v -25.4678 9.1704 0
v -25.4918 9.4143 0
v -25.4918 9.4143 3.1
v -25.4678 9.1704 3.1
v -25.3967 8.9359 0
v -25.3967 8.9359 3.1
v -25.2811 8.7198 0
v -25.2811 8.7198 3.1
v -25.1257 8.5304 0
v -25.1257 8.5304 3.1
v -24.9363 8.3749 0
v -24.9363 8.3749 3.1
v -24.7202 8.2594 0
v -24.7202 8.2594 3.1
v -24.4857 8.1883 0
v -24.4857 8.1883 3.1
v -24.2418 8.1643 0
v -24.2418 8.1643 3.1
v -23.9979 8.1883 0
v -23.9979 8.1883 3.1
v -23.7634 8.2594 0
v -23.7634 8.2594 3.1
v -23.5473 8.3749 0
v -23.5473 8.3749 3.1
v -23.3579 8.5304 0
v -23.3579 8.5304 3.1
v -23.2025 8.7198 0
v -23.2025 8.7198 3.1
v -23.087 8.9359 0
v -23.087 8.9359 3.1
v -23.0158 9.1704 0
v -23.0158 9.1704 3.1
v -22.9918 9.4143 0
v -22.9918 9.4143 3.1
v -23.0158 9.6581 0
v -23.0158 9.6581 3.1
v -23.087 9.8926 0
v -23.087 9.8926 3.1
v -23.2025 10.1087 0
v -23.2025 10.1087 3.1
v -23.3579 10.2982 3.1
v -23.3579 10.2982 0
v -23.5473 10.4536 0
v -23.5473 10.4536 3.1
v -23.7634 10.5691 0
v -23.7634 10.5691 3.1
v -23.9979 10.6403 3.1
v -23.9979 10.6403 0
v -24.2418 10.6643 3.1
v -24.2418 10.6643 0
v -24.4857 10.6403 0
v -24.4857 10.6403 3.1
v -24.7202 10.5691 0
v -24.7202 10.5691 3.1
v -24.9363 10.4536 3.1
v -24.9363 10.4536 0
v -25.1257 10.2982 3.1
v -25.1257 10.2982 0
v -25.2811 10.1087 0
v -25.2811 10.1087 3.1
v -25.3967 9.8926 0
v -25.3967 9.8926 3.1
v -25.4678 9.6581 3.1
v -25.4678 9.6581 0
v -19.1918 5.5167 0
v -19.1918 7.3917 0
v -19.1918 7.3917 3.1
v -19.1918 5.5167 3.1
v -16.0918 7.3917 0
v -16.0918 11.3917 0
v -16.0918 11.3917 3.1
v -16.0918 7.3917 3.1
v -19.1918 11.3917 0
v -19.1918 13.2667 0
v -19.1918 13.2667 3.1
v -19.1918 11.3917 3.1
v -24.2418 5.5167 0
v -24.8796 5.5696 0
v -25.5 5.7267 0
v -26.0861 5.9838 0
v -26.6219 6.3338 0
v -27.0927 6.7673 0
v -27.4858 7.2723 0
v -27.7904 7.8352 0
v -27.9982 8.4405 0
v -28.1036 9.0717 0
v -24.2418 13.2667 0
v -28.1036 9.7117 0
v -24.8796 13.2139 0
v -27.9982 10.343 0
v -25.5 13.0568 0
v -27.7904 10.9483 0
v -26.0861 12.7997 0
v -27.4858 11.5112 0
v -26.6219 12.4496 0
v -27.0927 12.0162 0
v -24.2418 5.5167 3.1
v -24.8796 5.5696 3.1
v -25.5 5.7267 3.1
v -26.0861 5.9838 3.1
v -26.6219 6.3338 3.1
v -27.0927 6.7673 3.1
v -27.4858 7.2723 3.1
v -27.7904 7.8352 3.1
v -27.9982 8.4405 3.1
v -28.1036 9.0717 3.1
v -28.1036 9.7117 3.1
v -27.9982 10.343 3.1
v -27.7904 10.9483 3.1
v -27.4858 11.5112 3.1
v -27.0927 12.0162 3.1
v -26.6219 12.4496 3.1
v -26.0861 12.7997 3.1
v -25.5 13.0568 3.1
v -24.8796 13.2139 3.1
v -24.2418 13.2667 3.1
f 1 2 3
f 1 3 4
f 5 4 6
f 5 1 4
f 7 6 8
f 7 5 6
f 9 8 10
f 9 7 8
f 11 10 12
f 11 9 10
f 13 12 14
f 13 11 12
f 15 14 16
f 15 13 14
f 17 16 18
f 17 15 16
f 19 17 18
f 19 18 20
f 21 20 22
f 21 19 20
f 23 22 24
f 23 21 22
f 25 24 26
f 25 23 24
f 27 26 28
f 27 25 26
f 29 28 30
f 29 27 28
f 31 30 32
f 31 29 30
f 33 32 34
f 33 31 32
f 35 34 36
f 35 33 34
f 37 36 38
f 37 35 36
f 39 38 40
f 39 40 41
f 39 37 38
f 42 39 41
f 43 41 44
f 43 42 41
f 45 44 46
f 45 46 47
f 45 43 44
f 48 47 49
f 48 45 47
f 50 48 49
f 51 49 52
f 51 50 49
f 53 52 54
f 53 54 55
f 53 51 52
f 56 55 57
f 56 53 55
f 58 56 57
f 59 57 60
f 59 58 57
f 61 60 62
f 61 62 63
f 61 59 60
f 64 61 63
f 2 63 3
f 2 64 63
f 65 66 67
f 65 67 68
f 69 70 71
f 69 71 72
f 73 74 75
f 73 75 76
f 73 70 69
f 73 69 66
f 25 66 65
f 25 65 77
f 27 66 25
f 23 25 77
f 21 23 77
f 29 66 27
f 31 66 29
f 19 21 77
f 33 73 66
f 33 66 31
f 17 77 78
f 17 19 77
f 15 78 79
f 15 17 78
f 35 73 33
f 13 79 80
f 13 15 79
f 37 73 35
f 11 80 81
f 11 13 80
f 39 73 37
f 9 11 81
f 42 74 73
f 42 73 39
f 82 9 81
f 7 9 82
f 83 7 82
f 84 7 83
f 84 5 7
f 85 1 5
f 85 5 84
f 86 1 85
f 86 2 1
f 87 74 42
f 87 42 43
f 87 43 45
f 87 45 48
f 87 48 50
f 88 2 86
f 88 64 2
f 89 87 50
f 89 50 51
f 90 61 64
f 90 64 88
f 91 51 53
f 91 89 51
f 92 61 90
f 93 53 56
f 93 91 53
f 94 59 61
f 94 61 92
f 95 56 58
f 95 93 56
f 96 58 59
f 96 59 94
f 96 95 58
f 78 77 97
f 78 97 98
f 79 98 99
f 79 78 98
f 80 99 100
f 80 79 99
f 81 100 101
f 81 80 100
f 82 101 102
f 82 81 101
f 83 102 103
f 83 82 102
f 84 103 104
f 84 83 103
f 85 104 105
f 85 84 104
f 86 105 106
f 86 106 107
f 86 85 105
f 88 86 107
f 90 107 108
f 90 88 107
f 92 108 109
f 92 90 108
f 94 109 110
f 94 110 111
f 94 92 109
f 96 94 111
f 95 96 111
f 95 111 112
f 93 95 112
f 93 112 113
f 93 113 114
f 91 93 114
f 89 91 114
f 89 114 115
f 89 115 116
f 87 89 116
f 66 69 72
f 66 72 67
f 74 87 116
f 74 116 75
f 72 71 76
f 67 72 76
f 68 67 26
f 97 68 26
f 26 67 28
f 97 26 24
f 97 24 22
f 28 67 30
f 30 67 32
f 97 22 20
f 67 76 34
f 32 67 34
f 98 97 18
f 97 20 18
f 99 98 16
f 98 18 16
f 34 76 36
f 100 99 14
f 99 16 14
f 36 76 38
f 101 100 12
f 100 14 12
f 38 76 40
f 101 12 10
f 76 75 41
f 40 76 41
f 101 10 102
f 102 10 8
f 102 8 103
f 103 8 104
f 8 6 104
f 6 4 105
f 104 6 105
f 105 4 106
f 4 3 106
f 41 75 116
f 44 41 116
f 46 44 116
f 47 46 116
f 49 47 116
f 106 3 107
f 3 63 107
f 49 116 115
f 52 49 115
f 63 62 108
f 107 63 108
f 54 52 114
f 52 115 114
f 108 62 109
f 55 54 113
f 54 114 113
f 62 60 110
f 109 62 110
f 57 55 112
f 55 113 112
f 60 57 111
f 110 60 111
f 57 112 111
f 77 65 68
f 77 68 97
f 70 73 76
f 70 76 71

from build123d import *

# Parameters (mm, degrees)
SKETCH1_R      = 1.25
EXTRUDE1_DEPTH = 3.1


with BuildPart() as part:
    # Sketch1 → Extrude1 (new body)
    with BuildSketch(Plane.XY):
        with BuildLine():
            Line((-19.191802054, 13.266728144), (-19.191802054, 11.391728144))
            Line((-19.191802054, 11.391728144), (-16.091802054, 11.391728144))
            Line((-16.091802054, 11.391728144), (-16.091802054, 7.391728144))
            Line((-16.091802054, 7.391728144), (-19.191802054, 7.391728144))
            Line((-19.191802054, 7.391728144), (-19.191802054, 5.516728144))
            Line((-19.191802054, 5.516728144), (-24.241802054, 5.516728144))
            ThreePointArc((-24.241802054, 5.516728144), (-28.116802054, 9.391728144), (-24.241802054, 13.266728144))
            Line((-24.241802054, 13.266728144), (-19.191802054, 13.266728144))
        make_face()
        with Locations(Location((-24.241802054, 9.414269496, 0), (0, 0, 180))):
            Circle(SKETCH1_R, mode=Mode.SUBTRACT)
    extrude(amount=EXTRUDE1_DEPTH)


solid = part.part
